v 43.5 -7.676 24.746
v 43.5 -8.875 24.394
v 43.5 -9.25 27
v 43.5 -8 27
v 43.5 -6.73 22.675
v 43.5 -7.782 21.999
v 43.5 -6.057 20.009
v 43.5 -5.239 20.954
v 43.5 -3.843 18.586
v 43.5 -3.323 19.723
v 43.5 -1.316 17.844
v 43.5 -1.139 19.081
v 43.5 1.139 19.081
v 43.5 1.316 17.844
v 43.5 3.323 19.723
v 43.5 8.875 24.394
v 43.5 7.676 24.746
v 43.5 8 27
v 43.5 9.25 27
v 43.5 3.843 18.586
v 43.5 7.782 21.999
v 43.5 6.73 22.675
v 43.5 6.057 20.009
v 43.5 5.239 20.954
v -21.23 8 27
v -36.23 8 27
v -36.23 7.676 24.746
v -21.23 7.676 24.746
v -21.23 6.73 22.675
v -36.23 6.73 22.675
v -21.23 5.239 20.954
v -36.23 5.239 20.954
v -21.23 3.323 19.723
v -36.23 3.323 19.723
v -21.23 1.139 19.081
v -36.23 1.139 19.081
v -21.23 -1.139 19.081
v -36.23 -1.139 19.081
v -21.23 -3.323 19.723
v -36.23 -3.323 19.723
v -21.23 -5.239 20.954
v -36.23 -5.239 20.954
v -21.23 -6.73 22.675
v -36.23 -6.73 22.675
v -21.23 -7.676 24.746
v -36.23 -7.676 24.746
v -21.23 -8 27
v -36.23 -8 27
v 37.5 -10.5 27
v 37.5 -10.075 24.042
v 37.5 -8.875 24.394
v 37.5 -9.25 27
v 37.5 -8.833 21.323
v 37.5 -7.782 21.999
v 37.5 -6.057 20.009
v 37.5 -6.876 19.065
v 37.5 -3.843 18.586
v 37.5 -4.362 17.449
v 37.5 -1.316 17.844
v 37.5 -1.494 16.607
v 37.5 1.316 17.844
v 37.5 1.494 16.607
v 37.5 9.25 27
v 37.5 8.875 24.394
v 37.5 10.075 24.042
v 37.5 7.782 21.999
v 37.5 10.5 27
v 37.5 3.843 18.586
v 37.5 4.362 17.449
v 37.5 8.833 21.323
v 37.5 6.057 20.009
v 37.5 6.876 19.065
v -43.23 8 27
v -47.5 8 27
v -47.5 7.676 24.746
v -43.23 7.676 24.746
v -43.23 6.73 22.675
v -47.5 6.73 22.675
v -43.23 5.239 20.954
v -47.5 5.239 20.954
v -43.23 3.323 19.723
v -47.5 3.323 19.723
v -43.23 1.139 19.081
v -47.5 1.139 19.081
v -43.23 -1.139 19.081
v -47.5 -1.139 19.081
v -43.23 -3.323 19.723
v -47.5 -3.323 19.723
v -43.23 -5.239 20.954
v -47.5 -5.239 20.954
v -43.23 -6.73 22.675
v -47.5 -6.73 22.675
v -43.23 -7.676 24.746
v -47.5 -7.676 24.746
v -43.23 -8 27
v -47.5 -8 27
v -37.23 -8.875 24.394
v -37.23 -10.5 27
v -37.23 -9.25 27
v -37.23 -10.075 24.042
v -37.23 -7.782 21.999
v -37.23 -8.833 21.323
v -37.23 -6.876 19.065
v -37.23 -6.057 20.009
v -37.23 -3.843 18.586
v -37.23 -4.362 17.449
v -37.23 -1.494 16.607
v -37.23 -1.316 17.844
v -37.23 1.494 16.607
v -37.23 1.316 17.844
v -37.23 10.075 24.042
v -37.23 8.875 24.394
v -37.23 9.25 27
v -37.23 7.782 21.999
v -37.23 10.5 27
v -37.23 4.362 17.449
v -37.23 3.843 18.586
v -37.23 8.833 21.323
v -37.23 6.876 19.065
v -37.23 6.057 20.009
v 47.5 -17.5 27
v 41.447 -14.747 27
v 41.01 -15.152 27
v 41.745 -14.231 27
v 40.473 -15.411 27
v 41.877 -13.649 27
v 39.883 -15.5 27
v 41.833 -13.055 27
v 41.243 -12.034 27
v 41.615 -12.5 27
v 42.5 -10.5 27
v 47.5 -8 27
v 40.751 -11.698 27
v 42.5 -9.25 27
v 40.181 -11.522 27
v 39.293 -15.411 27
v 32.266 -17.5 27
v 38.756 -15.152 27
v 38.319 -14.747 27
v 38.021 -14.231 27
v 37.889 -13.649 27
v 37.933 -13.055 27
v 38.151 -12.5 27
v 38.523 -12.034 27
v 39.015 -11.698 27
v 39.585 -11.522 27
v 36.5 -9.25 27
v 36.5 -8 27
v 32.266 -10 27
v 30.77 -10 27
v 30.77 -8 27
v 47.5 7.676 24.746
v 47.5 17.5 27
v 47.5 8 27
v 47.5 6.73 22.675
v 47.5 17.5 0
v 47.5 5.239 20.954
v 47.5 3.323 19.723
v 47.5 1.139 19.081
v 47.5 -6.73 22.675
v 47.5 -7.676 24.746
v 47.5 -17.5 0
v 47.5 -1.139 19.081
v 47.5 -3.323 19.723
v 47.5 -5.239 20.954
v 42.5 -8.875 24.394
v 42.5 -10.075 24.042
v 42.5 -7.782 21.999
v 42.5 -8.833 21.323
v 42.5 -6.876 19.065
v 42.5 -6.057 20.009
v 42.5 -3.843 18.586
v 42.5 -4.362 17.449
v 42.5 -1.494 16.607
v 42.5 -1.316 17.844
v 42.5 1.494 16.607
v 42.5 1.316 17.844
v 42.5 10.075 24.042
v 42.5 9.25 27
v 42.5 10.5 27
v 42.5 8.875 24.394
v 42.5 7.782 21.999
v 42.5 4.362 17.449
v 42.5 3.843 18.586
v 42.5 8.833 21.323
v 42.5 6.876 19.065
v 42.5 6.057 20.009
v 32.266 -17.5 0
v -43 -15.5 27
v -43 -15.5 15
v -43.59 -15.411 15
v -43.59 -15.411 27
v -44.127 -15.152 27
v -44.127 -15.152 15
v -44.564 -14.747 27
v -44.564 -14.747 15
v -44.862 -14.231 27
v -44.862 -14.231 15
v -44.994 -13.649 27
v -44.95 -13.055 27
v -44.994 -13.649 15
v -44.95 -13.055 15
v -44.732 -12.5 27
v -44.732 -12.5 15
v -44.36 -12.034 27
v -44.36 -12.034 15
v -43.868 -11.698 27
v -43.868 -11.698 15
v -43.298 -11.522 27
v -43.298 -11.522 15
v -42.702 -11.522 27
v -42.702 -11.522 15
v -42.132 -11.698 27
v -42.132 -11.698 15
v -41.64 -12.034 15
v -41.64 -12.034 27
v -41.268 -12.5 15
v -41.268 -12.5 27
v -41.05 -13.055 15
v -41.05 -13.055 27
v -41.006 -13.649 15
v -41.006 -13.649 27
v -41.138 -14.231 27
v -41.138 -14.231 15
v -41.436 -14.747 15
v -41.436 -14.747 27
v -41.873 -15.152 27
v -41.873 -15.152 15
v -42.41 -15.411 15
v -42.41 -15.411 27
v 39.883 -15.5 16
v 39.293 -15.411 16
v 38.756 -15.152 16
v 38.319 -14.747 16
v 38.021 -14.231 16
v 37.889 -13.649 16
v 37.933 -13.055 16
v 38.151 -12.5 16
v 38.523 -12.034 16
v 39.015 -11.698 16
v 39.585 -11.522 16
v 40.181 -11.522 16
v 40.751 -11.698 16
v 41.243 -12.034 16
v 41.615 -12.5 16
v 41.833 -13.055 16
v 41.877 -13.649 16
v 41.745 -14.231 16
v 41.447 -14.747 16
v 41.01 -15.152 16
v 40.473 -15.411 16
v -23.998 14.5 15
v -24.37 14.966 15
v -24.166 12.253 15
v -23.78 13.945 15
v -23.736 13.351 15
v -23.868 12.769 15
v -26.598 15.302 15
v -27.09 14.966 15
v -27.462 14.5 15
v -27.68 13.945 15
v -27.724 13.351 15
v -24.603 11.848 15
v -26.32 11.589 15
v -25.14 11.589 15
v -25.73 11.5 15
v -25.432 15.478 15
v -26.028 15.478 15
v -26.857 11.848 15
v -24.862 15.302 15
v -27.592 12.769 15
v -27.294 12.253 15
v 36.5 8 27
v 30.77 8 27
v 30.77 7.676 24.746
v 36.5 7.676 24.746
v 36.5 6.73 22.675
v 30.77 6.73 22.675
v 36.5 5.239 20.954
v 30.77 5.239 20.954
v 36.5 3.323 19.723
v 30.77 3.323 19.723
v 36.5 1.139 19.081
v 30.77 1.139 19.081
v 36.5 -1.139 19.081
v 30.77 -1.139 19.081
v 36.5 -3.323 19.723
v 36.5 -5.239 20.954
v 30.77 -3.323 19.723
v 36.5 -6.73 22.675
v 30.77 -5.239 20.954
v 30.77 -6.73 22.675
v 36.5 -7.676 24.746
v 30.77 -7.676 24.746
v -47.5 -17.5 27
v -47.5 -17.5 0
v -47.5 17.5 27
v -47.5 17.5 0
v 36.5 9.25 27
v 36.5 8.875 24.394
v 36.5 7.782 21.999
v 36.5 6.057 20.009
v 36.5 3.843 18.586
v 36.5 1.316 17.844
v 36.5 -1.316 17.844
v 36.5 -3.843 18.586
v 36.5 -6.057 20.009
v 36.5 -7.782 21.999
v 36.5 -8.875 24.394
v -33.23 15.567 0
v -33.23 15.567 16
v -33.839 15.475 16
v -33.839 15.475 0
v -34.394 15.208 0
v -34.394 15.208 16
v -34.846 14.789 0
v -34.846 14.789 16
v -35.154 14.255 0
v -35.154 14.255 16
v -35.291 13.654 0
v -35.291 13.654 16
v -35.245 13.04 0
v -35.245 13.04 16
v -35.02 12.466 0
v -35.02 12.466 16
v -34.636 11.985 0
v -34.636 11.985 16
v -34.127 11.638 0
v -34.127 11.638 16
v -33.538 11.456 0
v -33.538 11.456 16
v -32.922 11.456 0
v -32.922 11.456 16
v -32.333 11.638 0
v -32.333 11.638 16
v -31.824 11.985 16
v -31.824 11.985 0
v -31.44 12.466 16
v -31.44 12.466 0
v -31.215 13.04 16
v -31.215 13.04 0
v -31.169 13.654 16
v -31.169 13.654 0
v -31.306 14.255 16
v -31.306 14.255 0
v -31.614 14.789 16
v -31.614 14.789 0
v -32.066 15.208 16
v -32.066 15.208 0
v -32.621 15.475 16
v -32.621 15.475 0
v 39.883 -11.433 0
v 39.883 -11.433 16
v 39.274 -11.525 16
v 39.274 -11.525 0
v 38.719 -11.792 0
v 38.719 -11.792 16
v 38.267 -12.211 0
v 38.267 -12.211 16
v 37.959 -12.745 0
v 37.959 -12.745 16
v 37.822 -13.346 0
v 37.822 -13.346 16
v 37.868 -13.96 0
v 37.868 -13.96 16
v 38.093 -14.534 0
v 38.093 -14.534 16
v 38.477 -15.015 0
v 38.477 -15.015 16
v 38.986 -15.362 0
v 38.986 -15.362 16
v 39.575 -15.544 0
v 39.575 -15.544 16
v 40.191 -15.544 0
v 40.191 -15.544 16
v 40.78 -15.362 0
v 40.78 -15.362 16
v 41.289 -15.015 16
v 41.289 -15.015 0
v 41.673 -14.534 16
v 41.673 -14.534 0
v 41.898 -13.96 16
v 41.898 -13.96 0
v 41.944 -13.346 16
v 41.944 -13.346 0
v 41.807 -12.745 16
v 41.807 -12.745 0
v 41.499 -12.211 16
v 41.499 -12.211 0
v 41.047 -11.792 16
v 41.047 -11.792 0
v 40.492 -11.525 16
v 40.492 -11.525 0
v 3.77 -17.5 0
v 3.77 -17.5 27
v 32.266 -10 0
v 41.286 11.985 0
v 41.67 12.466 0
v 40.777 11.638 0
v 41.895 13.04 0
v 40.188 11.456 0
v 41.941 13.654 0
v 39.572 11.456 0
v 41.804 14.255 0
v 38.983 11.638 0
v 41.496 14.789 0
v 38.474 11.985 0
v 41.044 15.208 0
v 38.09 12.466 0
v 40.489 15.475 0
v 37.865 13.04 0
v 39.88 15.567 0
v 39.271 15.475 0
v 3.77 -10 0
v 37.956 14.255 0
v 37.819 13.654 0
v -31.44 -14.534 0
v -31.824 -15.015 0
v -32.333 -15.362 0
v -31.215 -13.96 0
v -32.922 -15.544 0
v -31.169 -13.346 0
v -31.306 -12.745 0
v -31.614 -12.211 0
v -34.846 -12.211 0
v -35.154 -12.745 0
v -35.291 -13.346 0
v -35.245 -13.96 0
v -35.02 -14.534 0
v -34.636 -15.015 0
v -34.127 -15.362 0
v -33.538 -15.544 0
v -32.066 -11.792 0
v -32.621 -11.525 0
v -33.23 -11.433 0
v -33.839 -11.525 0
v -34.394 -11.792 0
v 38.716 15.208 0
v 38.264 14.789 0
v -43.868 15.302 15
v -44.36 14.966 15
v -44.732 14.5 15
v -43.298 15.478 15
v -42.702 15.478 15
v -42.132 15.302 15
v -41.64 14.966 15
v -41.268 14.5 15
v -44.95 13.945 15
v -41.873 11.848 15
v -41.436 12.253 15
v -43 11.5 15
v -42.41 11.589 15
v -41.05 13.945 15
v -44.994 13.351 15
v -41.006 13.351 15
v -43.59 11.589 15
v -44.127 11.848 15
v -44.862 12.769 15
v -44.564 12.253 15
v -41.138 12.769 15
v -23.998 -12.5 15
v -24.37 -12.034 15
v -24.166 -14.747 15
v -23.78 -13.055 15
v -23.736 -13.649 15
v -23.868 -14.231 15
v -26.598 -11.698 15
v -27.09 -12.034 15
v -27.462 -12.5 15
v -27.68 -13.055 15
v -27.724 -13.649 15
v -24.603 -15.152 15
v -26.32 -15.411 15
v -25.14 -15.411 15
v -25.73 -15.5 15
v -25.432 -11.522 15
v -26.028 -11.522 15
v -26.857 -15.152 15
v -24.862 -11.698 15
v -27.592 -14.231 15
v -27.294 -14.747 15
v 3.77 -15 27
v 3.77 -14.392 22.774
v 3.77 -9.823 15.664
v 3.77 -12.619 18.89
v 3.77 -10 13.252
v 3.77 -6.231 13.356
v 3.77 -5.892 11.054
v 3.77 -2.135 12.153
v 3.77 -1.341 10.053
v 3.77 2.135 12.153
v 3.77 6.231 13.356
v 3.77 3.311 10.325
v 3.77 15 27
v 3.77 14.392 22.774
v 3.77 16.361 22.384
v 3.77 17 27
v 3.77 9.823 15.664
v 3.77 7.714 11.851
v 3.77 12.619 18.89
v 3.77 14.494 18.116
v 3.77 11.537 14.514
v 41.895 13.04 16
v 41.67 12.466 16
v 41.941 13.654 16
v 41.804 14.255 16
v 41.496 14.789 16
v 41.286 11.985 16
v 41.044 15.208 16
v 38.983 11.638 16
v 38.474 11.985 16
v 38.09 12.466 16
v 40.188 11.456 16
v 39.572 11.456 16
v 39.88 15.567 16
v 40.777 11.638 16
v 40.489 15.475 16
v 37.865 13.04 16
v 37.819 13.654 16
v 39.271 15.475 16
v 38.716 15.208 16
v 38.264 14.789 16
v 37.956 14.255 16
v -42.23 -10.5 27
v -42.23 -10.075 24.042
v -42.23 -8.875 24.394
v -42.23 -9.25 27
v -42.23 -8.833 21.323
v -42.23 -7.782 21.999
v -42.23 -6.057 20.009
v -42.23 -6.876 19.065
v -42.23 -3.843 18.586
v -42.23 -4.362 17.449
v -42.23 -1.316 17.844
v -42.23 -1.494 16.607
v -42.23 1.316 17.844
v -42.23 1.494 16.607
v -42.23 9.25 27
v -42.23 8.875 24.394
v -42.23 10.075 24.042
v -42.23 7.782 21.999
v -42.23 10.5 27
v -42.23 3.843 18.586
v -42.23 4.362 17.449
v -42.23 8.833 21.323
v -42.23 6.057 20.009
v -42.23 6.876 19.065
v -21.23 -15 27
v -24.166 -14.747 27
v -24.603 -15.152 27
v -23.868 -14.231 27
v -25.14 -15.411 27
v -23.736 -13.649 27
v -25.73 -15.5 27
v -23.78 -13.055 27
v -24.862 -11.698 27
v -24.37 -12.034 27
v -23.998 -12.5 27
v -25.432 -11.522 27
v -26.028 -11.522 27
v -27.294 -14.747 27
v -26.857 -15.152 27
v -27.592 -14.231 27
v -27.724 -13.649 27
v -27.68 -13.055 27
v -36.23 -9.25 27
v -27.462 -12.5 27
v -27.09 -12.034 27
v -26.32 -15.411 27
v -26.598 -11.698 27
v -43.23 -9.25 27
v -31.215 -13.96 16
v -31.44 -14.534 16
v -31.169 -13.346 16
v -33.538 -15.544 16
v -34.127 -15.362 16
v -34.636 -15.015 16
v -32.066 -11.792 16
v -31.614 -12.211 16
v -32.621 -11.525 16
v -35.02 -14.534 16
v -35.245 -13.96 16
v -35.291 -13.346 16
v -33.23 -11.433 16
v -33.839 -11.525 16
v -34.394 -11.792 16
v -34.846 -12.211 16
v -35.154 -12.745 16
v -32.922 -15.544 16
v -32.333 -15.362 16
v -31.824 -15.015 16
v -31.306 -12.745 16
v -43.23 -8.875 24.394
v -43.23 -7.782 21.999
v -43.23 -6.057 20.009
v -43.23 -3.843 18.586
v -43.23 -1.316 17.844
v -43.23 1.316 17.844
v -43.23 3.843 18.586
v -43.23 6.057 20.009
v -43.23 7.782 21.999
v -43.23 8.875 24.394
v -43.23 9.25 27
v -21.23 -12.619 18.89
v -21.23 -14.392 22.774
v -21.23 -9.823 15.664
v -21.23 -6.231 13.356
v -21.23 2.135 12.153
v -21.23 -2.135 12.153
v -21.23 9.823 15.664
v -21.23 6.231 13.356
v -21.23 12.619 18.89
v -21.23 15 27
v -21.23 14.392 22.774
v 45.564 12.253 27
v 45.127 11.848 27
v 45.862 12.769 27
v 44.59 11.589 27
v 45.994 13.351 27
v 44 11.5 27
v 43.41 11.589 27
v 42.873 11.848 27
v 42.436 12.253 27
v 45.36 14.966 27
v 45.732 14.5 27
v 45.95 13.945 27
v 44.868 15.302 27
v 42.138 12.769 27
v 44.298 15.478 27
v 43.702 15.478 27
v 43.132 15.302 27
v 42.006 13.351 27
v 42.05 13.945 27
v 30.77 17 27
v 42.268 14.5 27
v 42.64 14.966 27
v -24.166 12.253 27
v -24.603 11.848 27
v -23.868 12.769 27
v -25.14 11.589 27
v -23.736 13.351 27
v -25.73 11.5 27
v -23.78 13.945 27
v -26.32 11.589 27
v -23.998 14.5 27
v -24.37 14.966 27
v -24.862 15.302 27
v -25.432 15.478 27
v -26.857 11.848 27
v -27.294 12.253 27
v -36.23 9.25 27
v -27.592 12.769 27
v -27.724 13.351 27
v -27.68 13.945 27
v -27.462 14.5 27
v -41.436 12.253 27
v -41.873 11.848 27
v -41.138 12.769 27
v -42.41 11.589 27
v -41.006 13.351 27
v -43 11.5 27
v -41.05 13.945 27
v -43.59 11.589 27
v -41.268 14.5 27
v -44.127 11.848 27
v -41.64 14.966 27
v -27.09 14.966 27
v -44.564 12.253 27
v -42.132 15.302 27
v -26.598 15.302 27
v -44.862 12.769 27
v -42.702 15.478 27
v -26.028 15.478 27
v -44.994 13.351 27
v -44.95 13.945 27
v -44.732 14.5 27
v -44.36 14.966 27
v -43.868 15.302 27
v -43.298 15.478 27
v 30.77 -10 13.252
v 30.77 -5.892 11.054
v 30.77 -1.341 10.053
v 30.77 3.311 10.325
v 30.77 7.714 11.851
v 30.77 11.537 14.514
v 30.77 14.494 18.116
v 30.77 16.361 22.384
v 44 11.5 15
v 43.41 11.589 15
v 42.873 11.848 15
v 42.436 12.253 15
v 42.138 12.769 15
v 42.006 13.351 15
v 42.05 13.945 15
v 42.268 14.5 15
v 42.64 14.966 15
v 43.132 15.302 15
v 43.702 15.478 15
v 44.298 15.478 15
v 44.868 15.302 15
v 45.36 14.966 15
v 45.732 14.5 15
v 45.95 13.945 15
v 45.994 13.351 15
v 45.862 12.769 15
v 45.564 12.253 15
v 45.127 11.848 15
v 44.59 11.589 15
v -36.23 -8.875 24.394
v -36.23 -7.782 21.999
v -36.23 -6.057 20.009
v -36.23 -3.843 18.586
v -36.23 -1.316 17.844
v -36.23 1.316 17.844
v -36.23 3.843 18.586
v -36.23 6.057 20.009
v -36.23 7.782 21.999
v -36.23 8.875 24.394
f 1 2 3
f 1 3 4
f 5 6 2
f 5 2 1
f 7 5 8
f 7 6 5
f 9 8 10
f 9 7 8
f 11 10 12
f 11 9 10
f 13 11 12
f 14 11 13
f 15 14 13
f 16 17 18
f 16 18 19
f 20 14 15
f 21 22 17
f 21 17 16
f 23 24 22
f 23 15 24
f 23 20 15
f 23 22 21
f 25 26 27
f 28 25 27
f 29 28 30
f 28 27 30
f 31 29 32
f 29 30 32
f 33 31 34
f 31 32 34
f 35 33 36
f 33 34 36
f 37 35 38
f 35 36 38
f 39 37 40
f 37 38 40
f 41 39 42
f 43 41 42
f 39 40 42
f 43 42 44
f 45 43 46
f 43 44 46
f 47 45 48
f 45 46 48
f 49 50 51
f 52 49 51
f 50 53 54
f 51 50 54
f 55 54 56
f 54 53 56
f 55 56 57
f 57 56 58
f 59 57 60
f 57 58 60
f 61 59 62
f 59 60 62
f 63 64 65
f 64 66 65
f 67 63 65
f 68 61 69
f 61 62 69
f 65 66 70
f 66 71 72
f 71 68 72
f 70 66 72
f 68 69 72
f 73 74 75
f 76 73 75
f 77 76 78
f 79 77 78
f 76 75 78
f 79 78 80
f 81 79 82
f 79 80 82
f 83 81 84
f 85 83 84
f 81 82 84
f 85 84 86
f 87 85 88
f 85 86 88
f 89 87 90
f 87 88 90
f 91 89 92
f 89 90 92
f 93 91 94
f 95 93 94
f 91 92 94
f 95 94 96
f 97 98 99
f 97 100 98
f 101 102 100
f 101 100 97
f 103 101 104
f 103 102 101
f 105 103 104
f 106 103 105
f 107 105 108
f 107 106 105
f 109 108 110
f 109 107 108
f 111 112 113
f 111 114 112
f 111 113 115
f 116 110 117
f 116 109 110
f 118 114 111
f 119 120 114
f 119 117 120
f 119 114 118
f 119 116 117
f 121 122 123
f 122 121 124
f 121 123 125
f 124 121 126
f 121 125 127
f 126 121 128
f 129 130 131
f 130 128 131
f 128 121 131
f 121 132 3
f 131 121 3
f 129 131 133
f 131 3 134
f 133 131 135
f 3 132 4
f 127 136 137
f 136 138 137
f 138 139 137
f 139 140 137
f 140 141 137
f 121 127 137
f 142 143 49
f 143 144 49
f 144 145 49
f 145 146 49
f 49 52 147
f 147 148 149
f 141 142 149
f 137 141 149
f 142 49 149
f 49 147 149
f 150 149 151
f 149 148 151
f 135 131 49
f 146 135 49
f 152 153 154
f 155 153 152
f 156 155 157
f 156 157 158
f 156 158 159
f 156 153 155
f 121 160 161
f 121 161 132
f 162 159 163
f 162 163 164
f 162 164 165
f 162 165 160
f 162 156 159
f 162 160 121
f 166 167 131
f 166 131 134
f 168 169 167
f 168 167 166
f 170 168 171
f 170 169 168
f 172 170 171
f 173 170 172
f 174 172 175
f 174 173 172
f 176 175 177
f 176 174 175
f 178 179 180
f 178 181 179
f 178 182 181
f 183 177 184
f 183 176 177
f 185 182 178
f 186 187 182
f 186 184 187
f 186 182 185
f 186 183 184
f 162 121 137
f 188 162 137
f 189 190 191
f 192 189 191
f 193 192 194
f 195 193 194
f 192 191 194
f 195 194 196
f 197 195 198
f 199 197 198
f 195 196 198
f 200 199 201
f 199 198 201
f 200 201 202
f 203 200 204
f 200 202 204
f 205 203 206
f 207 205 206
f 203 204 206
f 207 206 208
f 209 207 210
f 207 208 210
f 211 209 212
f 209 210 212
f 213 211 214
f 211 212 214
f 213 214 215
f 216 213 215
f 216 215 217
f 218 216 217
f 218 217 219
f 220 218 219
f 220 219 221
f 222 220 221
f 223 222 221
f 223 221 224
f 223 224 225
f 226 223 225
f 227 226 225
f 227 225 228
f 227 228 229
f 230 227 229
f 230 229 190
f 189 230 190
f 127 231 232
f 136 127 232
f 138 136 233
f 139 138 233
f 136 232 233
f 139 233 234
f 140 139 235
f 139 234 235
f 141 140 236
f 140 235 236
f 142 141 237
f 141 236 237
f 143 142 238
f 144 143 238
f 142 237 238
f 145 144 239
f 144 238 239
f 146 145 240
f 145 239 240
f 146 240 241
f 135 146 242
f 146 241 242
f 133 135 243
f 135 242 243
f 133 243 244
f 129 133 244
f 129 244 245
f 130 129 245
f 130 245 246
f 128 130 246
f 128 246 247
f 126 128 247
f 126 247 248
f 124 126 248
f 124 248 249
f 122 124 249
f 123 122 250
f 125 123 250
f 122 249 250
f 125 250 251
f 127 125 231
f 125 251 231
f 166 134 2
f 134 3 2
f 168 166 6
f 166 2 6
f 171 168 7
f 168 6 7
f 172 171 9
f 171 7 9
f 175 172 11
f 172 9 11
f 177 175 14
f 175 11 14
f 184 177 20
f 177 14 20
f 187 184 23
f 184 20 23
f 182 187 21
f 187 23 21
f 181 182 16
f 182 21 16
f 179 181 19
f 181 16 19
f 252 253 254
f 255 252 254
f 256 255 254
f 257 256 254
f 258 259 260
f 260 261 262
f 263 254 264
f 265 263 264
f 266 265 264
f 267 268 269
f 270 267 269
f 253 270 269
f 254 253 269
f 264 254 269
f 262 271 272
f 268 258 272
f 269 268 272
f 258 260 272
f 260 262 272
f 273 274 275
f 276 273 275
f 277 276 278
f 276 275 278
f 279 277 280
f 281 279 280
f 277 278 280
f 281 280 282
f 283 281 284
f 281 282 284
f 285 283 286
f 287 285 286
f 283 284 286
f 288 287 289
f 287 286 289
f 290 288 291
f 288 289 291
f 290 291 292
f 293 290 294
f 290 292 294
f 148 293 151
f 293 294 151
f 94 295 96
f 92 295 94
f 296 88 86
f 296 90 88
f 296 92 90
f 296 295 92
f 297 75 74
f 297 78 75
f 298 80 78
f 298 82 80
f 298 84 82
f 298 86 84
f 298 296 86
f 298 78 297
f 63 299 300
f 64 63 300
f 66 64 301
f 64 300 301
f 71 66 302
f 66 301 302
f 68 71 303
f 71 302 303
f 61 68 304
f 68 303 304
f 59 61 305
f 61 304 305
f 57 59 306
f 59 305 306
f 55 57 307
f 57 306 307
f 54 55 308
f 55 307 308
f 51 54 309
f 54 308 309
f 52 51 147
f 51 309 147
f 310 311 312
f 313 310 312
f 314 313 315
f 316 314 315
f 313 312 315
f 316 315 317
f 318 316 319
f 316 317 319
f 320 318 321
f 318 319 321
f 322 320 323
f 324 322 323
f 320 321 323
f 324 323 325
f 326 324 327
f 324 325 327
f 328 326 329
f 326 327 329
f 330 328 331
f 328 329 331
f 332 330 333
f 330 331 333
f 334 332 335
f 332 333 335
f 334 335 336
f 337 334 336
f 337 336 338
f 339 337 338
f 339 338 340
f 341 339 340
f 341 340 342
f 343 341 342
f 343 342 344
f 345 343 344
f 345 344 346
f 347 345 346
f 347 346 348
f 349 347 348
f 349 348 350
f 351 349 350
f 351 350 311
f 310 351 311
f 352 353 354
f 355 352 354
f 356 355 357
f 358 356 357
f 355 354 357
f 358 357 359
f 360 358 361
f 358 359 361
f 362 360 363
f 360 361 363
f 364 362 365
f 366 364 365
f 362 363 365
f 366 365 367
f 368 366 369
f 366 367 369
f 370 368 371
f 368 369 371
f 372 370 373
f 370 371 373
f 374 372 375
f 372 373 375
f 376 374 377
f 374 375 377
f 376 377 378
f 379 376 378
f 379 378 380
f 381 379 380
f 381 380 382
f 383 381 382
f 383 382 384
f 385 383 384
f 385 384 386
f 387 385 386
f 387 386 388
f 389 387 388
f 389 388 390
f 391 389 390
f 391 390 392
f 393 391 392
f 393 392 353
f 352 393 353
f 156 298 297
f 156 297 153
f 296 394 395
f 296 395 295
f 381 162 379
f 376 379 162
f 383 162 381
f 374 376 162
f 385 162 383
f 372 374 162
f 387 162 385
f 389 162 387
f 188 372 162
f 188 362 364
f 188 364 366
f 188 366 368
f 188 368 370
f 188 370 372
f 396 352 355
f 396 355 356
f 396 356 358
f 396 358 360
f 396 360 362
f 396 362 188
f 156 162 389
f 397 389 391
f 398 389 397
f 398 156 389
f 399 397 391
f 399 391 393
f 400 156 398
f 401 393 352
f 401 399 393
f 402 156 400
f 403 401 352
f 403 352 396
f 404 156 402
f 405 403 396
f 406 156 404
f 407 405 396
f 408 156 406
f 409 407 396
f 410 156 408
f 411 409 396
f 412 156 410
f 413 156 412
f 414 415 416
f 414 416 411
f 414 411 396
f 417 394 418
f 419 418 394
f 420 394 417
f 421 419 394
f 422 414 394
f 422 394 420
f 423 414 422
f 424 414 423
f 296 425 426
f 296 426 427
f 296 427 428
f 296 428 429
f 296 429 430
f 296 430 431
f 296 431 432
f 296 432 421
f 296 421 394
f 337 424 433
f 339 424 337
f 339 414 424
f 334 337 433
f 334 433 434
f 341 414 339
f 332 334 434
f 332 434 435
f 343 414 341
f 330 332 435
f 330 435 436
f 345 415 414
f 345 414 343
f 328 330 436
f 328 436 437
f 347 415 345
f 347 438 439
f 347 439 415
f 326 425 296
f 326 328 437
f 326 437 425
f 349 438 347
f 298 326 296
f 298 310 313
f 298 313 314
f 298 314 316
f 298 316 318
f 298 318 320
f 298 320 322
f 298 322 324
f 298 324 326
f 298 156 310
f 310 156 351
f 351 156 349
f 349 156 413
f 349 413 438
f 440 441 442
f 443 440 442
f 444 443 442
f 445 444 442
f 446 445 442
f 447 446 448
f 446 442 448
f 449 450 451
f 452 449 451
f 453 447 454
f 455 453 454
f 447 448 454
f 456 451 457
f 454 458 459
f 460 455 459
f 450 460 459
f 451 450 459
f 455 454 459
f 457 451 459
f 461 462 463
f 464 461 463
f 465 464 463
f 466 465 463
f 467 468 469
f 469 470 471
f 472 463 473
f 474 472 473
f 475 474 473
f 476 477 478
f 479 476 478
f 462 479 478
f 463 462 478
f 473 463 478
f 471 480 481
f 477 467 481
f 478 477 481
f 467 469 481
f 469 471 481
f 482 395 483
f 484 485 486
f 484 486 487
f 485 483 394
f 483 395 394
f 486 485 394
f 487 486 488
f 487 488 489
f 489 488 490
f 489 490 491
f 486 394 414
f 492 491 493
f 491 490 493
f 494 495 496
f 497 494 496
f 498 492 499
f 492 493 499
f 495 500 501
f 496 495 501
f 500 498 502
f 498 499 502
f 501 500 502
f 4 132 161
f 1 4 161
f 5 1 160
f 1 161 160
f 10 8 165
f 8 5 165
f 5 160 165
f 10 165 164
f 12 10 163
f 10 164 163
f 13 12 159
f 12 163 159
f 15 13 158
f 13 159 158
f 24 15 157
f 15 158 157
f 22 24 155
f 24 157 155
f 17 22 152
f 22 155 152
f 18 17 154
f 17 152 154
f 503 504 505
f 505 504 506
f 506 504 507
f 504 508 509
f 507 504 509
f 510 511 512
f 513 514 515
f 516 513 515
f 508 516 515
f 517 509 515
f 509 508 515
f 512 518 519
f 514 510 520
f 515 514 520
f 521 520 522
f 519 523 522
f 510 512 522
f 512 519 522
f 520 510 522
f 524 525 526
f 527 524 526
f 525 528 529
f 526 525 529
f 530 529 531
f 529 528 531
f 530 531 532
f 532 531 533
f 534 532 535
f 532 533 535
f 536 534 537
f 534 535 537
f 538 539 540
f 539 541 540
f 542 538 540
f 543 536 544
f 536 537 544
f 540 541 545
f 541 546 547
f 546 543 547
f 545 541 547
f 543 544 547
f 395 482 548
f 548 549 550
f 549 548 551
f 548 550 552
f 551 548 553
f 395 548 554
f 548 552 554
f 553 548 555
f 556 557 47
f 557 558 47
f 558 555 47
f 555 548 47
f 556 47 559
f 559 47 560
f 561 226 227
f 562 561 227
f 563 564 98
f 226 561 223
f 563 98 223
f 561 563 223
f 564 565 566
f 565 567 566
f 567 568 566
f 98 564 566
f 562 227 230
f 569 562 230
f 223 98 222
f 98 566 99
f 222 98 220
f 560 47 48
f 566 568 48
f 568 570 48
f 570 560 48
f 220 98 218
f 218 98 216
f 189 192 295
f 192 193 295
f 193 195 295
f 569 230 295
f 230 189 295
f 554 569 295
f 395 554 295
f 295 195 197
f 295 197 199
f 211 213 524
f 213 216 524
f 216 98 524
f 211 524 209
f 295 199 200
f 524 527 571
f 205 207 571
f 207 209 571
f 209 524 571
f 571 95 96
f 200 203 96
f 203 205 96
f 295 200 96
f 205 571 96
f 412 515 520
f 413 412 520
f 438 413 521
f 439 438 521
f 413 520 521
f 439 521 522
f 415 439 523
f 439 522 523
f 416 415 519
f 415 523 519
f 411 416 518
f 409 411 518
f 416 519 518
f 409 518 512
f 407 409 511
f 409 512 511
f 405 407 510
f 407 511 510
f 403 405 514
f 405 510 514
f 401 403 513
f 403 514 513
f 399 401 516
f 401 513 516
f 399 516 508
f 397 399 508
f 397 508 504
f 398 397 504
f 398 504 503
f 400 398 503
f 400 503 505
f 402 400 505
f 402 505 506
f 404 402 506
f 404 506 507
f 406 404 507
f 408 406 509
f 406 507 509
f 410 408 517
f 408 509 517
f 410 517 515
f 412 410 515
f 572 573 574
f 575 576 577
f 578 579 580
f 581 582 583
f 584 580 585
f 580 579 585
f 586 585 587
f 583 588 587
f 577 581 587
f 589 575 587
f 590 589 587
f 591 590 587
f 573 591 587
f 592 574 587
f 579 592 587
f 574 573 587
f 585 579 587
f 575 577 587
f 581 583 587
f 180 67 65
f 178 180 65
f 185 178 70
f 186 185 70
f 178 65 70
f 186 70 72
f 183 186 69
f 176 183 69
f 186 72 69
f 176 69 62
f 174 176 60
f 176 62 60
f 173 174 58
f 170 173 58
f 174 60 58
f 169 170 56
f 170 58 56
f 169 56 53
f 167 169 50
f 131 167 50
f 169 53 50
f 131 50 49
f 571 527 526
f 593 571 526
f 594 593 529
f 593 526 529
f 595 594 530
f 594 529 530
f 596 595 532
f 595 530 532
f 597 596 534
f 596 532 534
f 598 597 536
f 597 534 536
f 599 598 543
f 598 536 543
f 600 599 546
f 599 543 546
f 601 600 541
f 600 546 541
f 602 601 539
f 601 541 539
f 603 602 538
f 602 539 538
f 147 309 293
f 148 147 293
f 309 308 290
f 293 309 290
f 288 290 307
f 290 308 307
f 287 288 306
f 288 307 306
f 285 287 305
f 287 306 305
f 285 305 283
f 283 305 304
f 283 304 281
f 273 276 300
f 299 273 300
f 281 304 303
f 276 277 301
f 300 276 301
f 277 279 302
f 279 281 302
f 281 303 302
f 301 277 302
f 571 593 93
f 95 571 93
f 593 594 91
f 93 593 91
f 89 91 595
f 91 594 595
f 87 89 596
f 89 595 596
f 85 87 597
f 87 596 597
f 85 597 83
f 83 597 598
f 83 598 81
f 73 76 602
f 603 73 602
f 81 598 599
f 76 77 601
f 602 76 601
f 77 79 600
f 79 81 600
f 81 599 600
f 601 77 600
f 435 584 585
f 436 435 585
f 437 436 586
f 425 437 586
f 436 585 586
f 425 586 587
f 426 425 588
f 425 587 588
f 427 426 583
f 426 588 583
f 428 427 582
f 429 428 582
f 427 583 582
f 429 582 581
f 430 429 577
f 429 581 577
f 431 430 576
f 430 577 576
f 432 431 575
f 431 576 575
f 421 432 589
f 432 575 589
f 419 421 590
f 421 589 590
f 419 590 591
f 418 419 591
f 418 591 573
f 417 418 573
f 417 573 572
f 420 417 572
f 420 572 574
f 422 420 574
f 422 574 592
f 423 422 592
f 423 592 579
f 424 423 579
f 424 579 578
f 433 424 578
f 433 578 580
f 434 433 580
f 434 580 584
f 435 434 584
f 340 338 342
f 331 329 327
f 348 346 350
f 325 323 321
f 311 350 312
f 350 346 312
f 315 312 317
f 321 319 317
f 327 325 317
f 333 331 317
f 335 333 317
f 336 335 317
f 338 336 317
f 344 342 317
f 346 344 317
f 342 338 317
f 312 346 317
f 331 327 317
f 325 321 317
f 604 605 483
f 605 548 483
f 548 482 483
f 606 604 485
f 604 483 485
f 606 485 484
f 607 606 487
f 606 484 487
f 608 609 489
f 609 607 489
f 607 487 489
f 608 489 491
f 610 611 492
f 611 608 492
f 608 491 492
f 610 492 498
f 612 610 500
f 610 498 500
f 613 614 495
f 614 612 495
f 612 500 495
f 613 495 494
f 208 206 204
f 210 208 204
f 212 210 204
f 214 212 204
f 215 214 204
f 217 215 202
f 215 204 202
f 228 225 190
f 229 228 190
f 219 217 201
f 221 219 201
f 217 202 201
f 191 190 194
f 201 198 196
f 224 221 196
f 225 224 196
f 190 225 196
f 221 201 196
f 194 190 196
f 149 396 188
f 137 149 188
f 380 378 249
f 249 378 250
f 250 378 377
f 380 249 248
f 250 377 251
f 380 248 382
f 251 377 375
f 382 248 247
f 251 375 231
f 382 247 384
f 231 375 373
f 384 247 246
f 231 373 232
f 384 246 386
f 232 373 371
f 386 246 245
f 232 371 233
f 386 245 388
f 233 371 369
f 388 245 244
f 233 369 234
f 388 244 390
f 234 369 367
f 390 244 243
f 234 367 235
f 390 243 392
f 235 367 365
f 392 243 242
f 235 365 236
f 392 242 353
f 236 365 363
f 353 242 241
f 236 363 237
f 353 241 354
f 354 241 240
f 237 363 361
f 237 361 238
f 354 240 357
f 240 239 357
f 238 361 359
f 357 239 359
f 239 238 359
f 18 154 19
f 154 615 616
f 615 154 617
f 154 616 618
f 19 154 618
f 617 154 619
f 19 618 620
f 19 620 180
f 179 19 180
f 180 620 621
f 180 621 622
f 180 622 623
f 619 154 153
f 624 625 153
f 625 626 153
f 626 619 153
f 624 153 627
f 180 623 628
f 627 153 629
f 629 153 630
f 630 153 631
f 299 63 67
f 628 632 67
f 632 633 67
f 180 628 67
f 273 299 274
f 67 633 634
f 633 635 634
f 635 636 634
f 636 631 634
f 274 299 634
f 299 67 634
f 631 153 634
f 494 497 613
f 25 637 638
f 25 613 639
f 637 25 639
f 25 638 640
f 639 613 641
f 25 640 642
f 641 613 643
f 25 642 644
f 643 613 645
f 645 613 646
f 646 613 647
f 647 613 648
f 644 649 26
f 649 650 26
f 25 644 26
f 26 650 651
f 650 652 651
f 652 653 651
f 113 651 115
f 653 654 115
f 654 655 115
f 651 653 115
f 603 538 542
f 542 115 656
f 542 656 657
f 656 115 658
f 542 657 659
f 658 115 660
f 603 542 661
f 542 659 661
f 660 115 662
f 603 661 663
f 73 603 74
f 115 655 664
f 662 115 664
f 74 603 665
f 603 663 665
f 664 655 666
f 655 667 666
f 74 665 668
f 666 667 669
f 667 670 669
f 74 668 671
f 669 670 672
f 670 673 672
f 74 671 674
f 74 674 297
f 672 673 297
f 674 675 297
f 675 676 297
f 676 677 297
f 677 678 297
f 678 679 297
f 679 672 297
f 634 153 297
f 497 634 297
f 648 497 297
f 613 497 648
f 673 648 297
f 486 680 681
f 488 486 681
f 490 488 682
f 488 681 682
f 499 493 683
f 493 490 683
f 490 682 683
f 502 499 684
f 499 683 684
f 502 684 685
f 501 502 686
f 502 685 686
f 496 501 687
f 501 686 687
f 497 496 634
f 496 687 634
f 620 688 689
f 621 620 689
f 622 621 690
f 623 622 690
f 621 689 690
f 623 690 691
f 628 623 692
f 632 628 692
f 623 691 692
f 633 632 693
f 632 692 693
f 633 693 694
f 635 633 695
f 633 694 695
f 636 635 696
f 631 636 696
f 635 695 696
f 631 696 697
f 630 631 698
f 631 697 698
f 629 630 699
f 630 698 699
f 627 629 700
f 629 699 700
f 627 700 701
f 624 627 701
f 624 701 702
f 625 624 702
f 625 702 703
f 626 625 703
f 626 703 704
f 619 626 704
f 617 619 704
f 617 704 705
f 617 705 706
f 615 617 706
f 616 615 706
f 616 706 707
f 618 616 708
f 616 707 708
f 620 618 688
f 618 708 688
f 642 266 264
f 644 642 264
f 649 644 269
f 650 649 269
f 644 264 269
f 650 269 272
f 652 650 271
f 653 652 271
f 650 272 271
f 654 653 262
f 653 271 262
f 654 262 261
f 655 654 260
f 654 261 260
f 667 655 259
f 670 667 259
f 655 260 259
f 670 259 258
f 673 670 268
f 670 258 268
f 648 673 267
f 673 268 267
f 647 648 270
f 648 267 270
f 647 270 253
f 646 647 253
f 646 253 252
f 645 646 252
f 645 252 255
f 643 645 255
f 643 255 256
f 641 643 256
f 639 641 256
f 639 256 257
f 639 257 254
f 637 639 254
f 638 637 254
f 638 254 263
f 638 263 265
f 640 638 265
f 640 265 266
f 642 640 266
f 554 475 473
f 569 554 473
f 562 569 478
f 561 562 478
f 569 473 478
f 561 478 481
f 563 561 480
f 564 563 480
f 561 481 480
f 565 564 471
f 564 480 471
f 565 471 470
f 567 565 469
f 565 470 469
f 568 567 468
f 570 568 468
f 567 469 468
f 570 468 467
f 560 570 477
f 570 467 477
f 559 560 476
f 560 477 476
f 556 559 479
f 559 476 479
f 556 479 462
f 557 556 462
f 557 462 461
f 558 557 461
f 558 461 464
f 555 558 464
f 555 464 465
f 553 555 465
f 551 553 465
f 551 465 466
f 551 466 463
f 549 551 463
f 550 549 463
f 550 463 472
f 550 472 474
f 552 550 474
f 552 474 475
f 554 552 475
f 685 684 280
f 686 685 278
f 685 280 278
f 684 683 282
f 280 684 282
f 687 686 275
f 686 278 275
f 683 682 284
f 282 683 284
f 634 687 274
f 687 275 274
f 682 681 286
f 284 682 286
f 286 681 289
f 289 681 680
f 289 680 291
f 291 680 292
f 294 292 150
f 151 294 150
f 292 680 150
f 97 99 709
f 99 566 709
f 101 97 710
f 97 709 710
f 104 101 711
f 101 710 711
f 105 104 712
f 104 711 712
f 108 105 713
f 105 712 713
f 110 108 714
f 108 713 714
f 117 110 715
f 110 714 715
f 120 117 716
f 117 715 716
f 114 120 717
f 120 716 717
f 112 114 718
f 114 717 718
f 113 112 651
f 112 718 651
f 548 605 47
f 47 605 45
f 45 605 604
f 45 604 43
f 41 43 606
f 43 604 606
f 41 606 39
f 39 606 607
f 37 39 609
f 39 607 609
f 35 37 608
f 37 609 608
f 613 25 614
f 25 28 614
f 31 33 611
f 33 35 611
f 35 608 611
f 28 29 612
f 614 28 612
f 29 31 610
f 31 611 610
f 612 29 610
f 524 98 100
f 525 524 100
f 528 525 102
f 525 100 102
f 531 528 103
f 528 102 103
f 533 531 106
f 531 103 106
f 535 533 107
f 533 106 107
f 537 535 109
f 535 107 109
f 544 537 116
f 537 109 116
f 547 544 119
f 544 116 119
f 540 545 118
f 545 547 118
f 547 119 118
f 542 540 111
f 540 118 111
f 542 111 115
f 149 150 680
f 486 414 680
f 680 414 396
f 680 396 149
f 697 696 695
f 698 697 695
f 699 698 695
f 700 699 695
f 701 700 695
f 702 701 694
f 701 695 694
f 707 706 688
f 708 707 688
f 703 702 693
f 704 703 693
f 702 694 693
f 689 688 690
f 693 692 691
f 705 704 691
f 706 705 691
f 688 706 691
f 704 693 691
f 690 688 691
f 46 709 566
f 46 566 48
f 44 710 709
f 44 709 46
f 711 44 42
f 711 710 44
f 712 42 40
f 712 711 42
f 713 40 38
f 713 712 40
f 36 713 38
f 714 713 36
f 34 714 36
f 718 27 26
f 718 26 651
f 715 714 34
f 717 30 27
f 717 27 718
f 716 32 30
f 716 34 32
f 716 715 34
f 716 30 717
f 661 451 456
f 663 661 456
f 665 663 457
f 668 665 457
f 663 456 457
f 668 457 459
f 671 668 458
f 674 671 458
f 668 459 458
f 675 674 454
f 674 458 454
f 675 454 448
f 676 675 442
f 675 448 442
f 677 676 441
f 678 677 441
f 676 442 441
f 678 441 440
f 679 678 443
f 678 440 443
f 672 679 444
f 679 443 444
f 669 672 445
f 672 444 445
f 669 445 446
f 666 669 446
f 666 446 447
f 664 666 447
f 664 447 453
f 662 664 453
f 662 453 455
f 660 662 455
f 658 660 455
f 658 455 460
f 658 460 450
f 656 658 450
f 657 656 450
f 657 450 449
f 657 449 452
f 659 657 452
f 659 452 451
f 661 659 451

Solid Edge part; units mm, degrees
sketch "Sketch1" plane through (0, 0, 0) normal (0, 0, 1) x (1, 0, 0)
  line L0 (47.5, -17.5) -> (-47.5, -17.5)
  line L1 (-47.5, -17.5) -> (-47.5, 17.5)
  line L2 (-47.5, 17.5) -> (47.5, 17.5)
  line L3 (47.5, 17.5) -> (47.5, -17.5)
  dimension "D1" = 95
  dimension "D2" = 35
extrude "Protrusion1" add sketch "Sketch1" along normal blind 27
sketch "Sketch2" plane through (0, 0, 27) normal (0, 0, 1) x (1, 0, 0)
  line L0 (3.77, 15) -> (3.77, 17)
  line L1 (3.77, 17) -> (30.77, 17)
  line L2 (30.77, 17) -> (30.77, 8)
  line L3 (36.5, 8) -> (30.77, 8)
  line L4 (36.5, 9.25) -> (36.5, 8)
  line L5 (37.5, 9.25) -> (36.5, 9.25)
  line L6 (37.5, 10.5) -> (37.5, 9.25)
  line L7 (42.5, 10.5) -> (37.5, 10.5)
  line L8 (42.5, 9.25) -> (42.5, 10.5)
  line L9 (42.5, 9.25) -> (43.5, 9.25)
  line L10 (43.5, 9.25) -> (43.5, 8)
  line L11 (43.5, 8) -> (47.5, 8)
  line L12 (47.5, 8) -> (47.5, 0)
  line L13 (-47.5, 0) -> (-47.5, 8)
  line L14 (-43.23, 8) -> (-47.5, 8)
  line L15 (-43.23, 8) -> (-43.23, 9.25)
  line L16 (-43.23, 9.25) -> (-42.23, 9.25)
  line L17 (-42.23, 9.25) -> (-42.23, 10.5)
  line L18 (-42.23, 10.5) -> (-37.23, 10.5)
  line L19 (-37.23, 10.5) -> (-37.23, 9.25)
  line L20 (-37.23, 9.25) -> (-36.23, 9.25)
  line L21 (-36.23, 9.25) -> (-36.23, 8)
  line L22 (-21.23, 8) -> (-36.23, 8)
  line L23 (-21.23, 8) -> (-21.23, 15)
  line L24 (-21.23, 15) -> (3.77, 15)
  dimension "D1" = 5
  dimension "D2" = 5
  dimension "D3" = 1
  dimension "D4" = 1
  dimension "D5" = 1
  dimension "D6" = 1
  dimension "D7" = 5
  dimension "D8" = 84.73
  dimension "D9" = 15
  dimension "D10" = 25
  dimension "D11" = 27
revolve "RevolvedCutout1" cut sketch "Sketch2" angle 360 about axis through (47.5, 0, 27) along (-1, 0, 0)
sketch "Sketch3" plane through (0, -17.5, 13.5) normal (0, -1, 0) x (1, 0, 0)
  line L0 (3.77, 5) -> (30.77, 5)
  line L1 (30.77, 5) -> (30.77, 13.5)
  line L2 (30.77, 13.5) -> (3.77, 13.5)
  line L3 (3.77, 13.5) -> (3.77, 5)
extrude "Extrusionsausschnitt_1" cut sketch "Sketch3" against normal blind 7.5
sketch "Sketch4" plane through (17.27, -16.1112, 18.5) normal (0, 0, 1) x (1, 0, 0)
  line L0 (-13.5, 6.1112) -> (13.5, 6.1112)
  line L1 (-13.5, -1.3888) -> (-13.5, 6.1112)
  line L2 (13.5, -1.3888) -> (-13.5, -1.3888)
  line L3 (14.996, -1.3888) -> (13.5, -1.3888)
  line L4 (14.996, 6.1112) -> (14.996, -1.3888)
  line L5 (13.5, 6.1112) -> (14.996, 6.1112)
  dimension "D1" = 7.5
  dimension "D2" = 1.496
extrude "Extrusionsausschnitt_2" cut sketch "Sketch4" along normal mid plane 100
hole "Bohrung_1" at (-25.73, 13.5, 27) direction (0, 0, -1) diameter 4 depth 12
hole "Hole1" at (39.883, -13.5, 27) direction (0, 0, -1) diameter 4 depth 12
hole "Hole2" at (-25.73, -13.5, 27) direction (0, 0, -1) diameter 4 depth 12
hole "Hole3" at (-43, -13.5, 27) direction (0, 0, -1) diameter 4 depth 12
hole "Hole4" at (-43, 13.5, 27) direction (0, 0, -1) diameter 4 depth 12
hole "Hole5" at (44, 13.5, 27) direction (0, 0, -1) diameter 4 depth 12
hole "Bohrung_8" at (-33.23, -13.5, 0) direction (0, 0, 1) diameter 4.134 depth 16
hole "Hole6" at (39.88, 13.5, 0) direction (0, 0, 1) diameter 4.134 depth 16
hole "Hole7" at (39.883, -13.5, 0) direction (0, 0, 1) diameter 4.134 depth 16
hole "Hole8" at (-33.23, 13.5, 0) direction (0, 0, 1) diameter 4.134 depth 16
properties material "Aluminium, 1060"
